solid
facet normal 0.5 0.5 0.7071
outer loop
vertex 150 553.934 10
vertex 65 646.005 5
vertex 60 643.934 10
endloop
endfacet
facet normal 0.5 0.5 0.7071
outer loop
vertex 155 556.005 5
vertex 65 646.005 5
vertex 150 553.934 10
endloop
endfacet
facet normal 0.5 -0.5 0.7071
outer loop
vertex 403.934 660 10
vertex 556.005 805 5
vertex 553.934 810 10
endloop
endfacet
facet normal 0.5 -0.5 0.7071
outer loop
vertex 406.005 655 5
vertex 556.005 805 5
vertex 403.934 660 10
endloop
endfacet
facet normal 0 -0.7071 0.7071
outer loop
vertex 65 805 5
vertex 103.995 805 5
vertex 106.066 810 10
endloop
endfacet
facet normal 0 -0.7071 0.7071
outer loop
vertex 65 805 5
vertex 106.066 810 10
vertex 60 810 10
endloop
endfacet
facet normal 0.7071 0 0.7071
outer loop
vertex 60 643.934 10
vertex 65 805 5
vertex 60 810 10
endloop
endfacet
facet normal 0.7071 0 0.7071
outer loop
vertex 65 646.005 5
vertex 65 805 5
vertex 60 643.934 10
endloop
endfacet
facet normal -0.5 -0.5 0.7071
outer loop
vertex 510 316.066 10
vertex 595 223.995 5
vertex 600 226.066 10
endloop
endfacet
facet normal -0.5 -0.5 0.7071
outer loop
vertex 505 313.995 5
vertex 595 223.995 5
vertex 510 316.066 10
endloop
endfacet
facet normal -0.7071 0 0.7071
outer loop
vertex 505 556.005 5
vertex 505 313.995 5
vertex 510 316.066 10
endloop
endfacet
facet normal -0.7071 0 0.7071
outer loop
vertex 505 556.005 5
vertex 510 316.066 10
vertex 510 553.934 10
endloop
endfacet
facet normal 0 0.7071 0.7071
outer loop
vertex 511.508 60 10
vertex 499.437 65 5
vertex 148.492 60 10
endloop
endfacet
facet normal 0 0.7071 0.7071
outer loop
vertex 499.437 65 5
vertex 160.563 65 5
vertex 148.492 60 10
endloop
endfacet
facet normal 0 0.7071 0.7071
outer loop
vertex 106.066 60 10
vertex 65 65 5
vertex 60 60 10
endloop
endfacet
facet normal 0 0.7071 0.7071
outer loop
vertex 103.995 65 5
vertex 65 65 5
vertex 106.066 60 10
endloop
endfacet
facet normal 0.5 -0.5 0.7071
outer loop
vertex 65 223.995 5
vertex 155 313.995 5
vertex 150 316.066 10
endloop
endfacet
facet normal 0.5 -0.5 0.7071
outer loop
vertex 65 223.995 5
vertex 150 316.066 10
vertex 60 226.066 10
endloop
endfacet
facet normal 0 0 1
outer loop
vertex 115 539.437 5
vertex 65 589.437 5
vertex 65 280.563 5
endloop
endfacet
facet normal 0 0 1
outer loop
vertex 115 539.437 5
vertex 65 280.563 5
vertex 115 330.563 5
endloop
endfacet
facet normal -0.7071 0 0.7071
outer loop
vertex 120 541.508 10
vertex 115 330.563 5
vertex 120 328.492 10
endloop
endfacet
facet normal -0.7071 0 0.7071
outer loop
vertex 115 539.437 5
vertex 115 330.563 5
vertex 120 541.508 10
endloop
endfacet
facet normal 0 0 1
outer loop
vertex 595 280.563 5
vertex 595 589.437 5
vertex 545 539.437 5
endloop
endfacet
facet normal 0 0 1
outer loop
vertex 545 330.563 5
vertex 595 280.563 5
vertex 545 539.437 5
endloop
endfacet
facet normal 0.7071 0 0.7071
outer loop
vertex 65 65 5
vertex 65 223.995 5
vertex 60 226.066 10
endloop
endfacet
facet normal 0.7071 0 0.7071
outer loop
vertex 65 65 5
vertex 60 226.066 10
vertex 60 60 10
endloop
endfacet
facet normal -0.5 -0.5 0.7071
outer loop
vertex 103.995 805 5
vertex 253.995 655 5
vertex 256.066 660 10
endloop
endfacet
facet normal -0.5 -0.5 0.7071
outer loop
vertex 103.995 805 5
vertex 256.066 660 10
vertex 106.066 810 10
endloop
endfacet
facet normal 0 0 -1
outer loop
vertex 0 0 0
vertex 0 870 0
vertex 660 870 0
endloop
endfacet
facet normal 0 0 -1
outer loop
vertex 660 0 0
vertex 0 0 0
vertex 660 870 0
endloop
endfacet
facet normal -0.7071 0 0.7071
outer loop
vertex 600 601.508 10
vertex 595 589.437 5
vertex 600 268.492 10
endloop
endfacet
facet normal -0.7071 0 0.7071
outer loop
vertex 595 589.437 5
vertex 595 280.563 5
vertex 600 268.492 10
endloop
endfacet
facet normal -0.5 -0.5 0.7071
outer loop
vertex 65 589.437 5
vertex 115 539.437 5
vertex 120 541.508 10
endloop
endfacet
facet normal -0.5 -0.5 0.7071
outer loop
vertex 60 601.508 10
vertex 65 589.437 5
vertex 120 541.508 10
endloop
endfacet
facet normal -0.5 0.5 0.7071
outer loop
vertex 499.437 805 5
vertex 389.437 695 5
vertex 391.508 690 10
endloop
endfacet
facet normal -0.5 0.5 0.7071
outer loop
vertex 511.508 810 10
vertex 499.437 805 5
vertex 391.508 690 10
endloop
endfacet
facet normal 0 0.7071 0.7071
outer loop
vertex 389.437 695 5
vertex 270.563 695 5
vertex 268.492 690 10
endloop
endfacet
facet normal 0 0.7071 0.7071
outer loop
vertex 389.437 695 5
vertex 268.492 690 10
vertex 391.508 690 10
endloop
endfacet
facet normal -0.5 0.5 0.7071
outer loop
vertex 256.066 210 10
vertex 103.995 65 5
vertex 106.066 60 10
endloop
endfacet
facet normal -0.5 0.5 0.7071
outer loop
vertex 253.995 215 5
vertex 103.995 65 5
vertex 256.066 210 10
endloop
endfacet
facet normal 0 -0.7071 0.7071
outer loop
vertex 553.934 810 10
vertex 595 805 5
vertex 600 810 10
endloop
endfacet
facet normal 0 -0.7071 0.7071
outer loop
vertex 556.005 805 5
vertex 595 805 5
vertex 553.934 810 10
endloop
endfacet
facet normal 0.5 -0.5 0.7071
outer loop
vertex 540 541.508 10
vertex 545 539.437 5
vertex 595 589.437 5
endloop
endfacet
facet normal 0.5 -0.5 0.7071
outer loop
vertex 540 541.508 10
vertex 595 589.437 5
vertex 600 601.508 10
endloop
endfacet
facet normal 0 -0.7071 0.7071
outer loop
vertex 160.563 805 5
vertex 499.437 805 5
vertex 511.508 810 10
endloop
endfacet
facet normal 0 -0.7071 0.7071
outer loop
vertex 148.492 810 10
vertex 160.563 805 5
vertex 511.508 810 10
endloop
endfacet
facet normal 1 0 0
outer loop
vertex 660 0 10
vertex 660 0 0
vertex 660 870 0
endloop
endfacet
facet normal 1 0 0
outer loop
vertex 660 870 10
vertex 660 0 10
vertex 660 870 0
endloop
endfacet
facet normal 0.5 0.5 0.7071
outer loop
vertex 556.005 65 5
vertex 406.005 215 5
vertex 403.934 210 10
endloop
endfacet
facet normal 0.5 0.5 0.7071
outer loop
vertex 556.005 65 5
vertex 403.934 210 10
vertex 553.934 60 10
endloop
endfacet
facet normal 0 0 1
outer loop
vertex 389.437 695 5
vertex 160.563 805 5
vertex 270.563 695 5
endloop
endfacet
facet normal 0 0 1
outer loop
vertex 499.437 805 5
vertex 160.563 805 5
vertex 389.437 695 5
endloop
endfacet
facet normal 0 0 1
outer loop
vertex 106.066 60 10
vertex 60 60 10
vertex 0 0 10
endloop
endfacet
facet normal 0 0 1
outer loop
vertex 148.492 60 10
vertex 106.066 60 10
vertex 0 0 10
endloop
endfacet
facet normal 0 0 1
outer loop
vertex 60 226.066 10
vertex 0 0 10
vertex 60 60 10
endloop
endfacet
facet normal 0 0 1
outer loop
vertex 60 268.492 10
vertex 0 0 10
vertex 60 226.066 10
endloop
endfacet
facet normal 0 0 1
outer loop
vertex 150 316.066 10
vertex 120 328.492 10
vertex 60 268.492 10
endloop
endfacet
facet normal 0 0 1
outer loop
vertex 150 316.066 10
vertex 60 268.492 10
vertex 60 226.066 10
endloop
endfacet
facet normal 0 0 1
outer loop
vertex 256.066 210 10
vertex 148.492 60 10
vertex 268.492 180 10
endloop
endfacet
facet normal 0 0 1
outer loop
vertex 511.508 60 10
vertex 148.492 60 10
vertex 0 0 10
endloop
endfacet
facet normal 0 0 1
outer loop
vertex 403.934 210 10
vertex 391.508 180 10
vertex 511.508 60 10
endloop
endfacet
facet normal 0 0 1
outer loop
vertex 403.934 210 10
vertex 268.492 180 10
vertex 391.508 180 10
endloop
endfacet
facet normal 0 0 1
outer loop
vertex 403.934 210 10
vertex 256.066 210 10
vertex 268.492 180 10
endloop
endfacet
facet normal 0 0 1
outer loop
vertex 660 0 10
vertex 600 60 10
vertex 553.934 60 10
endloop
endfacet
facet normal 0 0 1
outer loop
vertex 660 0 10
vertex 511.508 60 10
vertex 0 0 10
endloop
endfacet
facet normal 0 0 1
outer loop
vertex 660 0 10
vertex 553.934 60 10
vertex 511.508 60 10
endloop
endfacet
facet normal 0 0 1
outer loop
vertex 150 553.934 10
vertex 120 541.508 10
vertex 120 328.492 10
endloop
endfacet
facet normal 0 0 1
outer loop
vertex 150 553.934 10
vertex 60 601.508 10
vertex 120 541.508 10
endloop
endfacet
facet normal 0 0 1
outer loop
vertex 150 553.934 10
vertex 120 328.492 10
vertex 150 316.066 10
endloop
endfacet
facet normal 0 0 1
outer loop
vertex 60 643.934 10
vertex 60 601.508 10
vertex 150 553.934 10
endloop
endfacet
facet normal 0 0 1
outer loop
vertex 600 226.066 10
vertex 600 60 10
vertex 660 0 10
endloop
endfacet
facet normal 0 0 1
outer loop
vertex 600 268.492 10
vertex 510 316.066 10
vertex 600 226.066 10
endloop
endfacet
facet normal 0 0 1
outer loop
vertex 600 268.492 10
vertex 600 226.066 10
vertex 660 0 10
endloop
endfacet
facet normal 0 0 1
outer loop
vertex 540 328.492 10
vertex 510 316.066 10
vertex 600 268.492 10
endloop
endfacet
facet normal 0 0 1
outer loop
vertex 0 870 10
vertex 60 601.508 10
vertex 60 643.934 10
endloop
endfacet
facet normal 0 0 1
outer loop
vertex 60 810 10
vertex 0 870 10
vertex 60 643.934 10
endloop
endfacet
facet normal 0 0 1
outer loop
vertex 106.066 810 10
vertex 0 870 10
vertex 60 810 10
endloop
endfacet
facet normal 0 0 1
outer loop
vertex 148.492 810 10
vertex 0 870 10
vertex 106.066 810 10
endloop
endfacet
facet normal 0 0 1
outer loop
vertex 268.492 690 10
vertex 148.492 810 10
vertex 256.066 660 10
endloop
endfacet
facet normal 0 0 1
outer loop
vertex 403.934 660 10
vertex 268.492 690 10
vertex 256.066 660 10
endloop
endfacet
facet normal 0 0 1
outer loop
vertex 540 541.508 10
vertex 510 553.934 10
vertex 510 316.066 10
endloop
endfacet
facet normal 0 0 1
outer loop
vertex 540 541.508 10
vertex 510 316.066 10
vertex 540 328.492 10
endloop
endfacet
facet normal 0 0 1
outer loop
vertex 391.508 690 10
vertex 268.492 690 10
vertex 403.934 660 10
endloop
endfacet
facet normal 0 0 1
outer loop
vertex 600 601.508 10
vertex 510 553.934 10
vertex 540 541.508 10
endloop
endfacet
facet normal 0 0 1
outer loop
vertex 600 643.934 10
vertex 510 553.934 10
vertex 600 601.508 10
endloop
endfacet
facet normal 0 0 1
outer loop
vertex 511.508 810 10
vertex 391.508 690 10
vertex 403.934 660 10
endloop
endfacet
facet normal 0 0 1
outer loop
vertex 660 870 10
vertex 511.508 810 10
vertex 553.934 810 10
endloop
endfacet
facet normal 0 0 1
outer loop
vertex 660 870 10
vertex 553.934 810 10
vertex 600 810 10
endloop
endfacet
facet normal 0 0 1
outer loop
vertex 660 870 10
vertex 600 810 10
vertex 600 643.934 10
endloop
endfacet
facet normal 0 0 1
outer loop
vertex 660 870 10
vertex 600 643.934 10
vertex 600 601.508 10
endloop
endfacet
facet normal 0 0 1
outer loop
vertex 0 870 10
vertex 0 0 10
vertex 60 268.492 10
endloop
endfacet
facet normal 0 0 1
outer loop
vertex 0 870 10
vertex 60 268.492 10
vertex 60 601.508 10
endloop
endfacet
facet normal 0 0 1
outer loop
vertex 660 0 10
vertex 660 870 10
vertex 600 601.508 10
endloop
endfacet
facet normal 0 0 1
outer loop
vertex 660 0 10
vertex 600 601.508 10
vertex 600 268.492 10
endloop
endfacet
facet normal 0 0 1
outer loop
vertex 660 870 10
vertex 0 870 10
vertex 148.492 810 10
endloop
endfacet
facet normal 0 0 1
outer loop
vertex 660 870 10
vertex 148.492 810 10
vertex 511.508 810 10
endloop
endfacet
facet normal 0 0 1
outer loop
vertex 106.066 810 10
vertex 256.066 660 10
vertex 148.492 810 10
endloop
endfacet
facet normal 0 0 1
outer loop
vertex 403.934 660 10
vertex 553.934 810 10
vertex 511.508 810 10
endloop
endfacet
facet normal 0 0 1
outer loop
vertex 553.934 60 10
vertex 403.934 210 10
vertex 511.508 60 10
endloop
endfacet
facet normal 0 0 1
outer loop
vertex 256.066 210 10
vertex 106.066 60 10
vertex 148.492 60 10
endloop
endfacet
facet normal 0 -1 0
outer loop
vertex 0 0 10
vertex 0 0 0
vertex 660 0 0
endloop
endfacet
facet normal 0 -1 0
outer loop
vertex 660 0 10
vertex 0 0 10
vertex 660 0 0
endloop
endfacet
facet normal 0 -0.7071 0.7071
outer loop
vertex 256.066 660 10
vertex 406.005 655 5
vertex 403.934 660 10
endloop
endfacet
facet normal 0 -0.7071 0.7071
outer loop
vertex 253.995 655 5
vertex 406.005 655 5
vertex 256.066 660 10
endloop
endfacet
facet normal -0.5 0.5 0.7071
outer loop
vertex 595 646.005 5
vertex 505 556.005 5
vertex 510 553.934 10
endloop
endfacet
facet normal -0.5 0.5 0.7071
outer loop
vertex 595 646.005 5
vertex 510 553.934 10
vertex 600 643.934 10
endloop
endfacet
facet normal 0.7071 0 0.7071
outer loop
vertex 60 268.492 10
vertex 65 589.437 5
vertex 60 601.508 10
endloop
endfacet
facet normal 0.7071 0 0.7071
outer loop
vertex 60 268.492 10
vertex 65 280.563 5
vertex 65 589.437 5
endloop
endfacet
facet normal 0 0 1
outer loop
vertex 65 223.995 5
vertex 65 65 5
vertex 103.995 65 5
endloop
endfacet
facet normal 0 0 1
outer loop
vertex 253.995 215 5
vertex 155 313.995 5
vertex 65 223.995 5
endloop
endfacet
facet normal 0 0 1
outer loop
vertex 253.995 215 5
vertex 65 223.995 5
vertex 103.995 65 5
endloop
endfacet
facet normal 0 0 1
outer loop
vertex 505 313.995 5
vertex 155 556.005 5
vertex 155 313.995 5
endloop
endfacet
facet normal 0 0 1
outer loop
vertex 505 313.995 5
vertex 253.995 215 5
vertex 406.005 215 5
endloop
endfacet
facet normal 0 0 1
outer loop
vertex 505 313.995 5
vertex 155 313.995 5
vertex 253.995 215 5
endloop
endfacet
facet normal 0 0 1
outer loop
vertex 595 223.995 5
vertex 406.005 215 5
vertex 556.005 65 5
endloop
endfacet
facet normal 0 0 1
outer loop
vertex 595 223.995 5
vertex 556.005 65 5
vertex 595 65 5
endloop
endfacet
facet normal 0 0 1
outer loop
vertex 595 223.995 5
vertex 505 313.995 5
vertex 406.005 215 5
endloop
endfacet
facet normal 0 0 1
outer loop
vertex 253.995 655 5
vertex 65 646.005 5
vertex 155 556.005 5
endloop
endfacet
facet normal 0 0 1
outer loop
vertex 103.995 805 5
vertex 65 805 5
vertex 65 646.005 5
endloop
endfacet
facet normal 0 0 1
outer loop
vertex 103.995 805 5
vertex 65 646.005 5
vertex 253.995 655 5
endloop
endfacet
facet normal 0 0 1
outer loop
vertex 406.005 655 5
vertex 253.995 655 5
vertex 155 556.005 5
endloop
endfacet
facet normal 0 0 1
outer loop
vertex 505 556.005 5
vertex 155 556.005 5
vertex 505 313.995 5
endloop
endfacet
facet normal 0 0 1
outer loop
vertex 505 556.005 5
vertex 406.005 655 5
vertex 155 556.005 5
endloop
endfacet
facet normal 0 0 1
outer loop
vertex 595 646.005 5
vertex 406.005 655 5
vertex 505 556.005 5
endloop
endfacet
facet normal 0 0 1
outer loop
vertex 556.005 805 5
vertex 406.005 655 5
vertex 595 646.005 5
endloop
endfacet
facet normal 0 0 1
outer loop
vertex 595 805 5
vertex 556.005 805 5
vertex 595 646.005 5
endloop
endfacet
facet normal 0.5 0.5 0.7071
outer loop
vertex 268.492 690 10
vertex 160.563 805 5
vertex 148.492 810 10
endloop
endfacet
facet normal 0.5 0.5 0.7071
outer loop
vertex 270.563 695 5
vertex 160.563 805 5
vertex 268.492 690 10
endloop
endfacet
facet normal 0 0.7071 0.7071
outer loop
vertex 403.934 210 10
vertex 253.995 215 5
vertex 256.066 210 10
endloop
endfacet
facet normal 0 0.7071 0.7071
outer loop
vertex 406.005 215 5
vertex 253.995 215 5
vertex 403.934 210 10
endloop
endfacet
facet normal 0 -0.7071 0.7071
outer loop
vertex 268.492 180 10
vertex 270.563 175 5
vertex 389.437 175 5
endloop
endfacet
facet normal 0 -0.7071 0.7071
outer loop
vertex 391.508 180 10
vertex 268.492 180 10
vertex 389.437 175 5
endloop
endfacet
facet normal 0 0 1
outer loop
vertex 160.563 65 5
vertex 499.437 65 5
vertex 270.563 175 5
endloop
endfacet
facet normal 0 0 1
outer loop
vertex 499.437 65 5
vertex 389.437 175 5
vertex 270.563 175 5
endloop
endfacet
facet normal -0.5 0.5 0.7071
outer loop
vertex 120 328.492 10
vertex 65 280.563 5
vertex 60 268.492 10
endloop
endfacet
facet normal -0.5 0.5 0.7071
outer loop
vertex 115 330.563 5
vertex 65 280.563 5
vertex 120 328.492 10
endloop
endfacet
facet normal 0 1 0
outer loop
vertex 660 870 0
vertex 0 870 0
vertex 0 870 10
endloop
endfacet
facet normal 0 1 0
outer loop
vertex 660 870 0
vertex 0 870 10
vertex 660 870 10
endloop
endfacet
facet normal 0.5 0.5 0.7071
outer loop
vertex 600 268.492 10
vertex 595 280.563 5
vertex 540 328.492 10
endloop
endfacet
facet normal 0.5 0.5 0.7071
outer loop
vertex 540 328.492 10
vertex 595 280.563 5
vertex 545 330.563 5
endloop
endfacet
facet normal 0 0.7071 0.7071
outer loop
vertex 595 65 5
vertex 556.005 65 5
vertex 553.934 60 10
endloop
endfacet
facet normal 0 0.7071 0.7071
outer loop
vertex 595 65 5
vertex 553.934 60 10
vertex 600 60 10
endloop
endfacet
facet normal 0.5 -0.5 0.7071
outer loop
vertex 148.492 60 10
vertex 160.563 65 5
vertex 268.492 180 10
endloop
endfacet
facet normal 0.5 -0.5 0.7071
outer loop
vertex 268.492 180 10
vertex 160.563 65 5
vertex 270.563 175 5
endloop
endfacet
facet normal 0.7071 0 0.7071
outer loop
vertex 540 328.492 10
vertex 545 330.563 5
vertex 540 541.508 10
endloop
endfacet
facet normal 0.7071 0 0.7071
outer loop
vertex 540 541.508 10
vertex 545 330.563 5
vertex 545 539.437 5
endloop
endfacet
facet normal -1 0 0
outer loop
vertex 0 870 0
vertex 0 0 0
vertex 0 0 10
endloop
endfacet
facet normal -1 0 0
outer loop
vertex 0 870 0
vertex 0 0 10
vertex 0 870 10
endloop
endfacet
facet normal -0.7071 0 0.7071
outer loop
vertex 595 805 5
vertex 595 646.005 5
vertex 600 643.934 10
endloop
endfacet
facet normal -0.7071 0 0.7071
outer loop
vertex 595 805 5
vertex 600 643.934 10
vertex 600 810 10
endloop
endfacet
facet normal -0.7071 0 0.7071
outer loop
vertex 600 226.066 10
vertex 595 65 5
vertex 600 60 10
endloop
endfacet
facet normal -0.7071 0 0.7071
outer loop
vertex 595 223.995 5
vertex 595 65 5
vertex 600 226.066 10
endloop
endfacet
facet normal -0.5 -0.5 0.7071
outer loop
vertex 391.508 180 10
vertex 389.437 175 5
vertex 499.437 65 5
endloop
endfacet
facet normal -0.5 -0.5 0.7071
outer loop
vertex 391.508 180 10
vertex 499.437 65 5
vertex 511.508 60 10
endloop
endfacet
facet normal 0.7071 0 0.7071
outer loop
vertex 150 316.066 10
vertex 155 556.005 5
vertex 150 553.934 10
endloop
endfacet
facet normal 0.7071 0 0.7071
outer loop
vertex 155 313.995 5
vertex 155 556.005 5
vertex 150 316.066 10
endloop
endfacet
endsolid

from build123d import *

# Parameters (mm, degrees)
ESQUISSE1_W             = 660
ESQUISSE1_H             = 870
BOSS_EXTRU_1_DEPTH      = 10
ENL_V_MAT_EXTRU_1_DEPTH = 5
CHANFREIN1_SIZE         = 5


with BuildPart() as part:
    # Esquisse1 → Boss.-Extru.1 (new body)
    with BuildSketch(Plane.XY):
        with Locations((330, 435)):
            Rectangle(ESQUISSE1_W, ESQUISSE1_H)
    extrude(amount=BOSS_EXTRU_1_DEPTH)

    # Esquisse2 → Enlèv. mat.-Extru.1 (cut)
    with BuildSketch(Plane.XY.offset(10)):
        Polygon((120, 328.492424049), (120, 541.507575951), (60, 601.507575951), (60, 268.492424049), align=None)
        Polygon((268.492424049, 690), (391.507575951, 690), (511.507575951, 810), (148.492424049, 810), align=None)
        Polygon((60, 810), (60, 643.933982822), (150, 553.933982822), (150, 316.066017178), (60, 226.066017178), (60, 60), (106.066017178, 60), (256.066017178, 210), (403.933982822, 210), (553.933982822, 60), (600, 60), (600, 226.066017178), (510, 316.066017178), (510, 553.933982822), (600, 643.933982822), (600, 810), (553.933982822, 810), (403.933982822, 660), (256.066017178, 660), (106.066017178, 810), align=None)
        Polygon((540, 328.492424049), (540, 541.507575951), (600, 601.507575951), (600, 268.492424049), align=None)
        Polygon((511.507575951, 60), (148.492424049, 60), (268.492424049, 180), (391.507575951, 180), align=None)
    extrude(amount=-ENL_V_MAT_EXTRU_1_DEPTH, mode=Mode.SUBTRACT)

    # Chanfrein1
    chanfrein1_edges = [part.edges().sort_by_distance(p)[0] for p in [
        (330, 60, 5),
        (208.492424049, 120, 5),
        (330, 180, 5),
        (451.507575951, 120, 5),
        (60, 435, 5),
        (90, 571.507575951, 5),
        (120, 435, 5),
        (90, 298.492424049, 5),
        (600, 435, 5),
        (570, 298.492424049, 5),
        (540, 435, 5),
        (570, 571.507575951, 5),
        (181.066017178, 735, 5),
        (330, 660, 5),
        (478.933982822, 735, 5),
        (576.966991411, 810, 5),
        (600, 726.966991411, 5),
        (555, 598.933982822, 5),
        (510, 435, 5),
        (555, 271.066017178, 5),
        (600, 143.033008589, 5),
        (576.966991411, 60, 5),
        (478.933982822, 135, 5),
        (330, 210, 5),
        (181.066017178, 135, 5),
        (83.033008589, 60, 5),
        (60, 143.033008589, 5),
        (105, 271.066017178, 5),
        (150, 435, 5),
        (105, 598.933982822, 5),
        (60, 726.966991411, 5),
        (83.033008589, 810, 5),
        (330, 810, 5),
        (451.507575951, 750, 5),
        (330, 690, 5),
        (208.492424049, 750, 5),
    ]]
    chamfer(chanfrein1_edges, length=CHANFREIN1_SIZE - 0.0001)  # a hair under: the kernel refuses the full size


solid = part.part
